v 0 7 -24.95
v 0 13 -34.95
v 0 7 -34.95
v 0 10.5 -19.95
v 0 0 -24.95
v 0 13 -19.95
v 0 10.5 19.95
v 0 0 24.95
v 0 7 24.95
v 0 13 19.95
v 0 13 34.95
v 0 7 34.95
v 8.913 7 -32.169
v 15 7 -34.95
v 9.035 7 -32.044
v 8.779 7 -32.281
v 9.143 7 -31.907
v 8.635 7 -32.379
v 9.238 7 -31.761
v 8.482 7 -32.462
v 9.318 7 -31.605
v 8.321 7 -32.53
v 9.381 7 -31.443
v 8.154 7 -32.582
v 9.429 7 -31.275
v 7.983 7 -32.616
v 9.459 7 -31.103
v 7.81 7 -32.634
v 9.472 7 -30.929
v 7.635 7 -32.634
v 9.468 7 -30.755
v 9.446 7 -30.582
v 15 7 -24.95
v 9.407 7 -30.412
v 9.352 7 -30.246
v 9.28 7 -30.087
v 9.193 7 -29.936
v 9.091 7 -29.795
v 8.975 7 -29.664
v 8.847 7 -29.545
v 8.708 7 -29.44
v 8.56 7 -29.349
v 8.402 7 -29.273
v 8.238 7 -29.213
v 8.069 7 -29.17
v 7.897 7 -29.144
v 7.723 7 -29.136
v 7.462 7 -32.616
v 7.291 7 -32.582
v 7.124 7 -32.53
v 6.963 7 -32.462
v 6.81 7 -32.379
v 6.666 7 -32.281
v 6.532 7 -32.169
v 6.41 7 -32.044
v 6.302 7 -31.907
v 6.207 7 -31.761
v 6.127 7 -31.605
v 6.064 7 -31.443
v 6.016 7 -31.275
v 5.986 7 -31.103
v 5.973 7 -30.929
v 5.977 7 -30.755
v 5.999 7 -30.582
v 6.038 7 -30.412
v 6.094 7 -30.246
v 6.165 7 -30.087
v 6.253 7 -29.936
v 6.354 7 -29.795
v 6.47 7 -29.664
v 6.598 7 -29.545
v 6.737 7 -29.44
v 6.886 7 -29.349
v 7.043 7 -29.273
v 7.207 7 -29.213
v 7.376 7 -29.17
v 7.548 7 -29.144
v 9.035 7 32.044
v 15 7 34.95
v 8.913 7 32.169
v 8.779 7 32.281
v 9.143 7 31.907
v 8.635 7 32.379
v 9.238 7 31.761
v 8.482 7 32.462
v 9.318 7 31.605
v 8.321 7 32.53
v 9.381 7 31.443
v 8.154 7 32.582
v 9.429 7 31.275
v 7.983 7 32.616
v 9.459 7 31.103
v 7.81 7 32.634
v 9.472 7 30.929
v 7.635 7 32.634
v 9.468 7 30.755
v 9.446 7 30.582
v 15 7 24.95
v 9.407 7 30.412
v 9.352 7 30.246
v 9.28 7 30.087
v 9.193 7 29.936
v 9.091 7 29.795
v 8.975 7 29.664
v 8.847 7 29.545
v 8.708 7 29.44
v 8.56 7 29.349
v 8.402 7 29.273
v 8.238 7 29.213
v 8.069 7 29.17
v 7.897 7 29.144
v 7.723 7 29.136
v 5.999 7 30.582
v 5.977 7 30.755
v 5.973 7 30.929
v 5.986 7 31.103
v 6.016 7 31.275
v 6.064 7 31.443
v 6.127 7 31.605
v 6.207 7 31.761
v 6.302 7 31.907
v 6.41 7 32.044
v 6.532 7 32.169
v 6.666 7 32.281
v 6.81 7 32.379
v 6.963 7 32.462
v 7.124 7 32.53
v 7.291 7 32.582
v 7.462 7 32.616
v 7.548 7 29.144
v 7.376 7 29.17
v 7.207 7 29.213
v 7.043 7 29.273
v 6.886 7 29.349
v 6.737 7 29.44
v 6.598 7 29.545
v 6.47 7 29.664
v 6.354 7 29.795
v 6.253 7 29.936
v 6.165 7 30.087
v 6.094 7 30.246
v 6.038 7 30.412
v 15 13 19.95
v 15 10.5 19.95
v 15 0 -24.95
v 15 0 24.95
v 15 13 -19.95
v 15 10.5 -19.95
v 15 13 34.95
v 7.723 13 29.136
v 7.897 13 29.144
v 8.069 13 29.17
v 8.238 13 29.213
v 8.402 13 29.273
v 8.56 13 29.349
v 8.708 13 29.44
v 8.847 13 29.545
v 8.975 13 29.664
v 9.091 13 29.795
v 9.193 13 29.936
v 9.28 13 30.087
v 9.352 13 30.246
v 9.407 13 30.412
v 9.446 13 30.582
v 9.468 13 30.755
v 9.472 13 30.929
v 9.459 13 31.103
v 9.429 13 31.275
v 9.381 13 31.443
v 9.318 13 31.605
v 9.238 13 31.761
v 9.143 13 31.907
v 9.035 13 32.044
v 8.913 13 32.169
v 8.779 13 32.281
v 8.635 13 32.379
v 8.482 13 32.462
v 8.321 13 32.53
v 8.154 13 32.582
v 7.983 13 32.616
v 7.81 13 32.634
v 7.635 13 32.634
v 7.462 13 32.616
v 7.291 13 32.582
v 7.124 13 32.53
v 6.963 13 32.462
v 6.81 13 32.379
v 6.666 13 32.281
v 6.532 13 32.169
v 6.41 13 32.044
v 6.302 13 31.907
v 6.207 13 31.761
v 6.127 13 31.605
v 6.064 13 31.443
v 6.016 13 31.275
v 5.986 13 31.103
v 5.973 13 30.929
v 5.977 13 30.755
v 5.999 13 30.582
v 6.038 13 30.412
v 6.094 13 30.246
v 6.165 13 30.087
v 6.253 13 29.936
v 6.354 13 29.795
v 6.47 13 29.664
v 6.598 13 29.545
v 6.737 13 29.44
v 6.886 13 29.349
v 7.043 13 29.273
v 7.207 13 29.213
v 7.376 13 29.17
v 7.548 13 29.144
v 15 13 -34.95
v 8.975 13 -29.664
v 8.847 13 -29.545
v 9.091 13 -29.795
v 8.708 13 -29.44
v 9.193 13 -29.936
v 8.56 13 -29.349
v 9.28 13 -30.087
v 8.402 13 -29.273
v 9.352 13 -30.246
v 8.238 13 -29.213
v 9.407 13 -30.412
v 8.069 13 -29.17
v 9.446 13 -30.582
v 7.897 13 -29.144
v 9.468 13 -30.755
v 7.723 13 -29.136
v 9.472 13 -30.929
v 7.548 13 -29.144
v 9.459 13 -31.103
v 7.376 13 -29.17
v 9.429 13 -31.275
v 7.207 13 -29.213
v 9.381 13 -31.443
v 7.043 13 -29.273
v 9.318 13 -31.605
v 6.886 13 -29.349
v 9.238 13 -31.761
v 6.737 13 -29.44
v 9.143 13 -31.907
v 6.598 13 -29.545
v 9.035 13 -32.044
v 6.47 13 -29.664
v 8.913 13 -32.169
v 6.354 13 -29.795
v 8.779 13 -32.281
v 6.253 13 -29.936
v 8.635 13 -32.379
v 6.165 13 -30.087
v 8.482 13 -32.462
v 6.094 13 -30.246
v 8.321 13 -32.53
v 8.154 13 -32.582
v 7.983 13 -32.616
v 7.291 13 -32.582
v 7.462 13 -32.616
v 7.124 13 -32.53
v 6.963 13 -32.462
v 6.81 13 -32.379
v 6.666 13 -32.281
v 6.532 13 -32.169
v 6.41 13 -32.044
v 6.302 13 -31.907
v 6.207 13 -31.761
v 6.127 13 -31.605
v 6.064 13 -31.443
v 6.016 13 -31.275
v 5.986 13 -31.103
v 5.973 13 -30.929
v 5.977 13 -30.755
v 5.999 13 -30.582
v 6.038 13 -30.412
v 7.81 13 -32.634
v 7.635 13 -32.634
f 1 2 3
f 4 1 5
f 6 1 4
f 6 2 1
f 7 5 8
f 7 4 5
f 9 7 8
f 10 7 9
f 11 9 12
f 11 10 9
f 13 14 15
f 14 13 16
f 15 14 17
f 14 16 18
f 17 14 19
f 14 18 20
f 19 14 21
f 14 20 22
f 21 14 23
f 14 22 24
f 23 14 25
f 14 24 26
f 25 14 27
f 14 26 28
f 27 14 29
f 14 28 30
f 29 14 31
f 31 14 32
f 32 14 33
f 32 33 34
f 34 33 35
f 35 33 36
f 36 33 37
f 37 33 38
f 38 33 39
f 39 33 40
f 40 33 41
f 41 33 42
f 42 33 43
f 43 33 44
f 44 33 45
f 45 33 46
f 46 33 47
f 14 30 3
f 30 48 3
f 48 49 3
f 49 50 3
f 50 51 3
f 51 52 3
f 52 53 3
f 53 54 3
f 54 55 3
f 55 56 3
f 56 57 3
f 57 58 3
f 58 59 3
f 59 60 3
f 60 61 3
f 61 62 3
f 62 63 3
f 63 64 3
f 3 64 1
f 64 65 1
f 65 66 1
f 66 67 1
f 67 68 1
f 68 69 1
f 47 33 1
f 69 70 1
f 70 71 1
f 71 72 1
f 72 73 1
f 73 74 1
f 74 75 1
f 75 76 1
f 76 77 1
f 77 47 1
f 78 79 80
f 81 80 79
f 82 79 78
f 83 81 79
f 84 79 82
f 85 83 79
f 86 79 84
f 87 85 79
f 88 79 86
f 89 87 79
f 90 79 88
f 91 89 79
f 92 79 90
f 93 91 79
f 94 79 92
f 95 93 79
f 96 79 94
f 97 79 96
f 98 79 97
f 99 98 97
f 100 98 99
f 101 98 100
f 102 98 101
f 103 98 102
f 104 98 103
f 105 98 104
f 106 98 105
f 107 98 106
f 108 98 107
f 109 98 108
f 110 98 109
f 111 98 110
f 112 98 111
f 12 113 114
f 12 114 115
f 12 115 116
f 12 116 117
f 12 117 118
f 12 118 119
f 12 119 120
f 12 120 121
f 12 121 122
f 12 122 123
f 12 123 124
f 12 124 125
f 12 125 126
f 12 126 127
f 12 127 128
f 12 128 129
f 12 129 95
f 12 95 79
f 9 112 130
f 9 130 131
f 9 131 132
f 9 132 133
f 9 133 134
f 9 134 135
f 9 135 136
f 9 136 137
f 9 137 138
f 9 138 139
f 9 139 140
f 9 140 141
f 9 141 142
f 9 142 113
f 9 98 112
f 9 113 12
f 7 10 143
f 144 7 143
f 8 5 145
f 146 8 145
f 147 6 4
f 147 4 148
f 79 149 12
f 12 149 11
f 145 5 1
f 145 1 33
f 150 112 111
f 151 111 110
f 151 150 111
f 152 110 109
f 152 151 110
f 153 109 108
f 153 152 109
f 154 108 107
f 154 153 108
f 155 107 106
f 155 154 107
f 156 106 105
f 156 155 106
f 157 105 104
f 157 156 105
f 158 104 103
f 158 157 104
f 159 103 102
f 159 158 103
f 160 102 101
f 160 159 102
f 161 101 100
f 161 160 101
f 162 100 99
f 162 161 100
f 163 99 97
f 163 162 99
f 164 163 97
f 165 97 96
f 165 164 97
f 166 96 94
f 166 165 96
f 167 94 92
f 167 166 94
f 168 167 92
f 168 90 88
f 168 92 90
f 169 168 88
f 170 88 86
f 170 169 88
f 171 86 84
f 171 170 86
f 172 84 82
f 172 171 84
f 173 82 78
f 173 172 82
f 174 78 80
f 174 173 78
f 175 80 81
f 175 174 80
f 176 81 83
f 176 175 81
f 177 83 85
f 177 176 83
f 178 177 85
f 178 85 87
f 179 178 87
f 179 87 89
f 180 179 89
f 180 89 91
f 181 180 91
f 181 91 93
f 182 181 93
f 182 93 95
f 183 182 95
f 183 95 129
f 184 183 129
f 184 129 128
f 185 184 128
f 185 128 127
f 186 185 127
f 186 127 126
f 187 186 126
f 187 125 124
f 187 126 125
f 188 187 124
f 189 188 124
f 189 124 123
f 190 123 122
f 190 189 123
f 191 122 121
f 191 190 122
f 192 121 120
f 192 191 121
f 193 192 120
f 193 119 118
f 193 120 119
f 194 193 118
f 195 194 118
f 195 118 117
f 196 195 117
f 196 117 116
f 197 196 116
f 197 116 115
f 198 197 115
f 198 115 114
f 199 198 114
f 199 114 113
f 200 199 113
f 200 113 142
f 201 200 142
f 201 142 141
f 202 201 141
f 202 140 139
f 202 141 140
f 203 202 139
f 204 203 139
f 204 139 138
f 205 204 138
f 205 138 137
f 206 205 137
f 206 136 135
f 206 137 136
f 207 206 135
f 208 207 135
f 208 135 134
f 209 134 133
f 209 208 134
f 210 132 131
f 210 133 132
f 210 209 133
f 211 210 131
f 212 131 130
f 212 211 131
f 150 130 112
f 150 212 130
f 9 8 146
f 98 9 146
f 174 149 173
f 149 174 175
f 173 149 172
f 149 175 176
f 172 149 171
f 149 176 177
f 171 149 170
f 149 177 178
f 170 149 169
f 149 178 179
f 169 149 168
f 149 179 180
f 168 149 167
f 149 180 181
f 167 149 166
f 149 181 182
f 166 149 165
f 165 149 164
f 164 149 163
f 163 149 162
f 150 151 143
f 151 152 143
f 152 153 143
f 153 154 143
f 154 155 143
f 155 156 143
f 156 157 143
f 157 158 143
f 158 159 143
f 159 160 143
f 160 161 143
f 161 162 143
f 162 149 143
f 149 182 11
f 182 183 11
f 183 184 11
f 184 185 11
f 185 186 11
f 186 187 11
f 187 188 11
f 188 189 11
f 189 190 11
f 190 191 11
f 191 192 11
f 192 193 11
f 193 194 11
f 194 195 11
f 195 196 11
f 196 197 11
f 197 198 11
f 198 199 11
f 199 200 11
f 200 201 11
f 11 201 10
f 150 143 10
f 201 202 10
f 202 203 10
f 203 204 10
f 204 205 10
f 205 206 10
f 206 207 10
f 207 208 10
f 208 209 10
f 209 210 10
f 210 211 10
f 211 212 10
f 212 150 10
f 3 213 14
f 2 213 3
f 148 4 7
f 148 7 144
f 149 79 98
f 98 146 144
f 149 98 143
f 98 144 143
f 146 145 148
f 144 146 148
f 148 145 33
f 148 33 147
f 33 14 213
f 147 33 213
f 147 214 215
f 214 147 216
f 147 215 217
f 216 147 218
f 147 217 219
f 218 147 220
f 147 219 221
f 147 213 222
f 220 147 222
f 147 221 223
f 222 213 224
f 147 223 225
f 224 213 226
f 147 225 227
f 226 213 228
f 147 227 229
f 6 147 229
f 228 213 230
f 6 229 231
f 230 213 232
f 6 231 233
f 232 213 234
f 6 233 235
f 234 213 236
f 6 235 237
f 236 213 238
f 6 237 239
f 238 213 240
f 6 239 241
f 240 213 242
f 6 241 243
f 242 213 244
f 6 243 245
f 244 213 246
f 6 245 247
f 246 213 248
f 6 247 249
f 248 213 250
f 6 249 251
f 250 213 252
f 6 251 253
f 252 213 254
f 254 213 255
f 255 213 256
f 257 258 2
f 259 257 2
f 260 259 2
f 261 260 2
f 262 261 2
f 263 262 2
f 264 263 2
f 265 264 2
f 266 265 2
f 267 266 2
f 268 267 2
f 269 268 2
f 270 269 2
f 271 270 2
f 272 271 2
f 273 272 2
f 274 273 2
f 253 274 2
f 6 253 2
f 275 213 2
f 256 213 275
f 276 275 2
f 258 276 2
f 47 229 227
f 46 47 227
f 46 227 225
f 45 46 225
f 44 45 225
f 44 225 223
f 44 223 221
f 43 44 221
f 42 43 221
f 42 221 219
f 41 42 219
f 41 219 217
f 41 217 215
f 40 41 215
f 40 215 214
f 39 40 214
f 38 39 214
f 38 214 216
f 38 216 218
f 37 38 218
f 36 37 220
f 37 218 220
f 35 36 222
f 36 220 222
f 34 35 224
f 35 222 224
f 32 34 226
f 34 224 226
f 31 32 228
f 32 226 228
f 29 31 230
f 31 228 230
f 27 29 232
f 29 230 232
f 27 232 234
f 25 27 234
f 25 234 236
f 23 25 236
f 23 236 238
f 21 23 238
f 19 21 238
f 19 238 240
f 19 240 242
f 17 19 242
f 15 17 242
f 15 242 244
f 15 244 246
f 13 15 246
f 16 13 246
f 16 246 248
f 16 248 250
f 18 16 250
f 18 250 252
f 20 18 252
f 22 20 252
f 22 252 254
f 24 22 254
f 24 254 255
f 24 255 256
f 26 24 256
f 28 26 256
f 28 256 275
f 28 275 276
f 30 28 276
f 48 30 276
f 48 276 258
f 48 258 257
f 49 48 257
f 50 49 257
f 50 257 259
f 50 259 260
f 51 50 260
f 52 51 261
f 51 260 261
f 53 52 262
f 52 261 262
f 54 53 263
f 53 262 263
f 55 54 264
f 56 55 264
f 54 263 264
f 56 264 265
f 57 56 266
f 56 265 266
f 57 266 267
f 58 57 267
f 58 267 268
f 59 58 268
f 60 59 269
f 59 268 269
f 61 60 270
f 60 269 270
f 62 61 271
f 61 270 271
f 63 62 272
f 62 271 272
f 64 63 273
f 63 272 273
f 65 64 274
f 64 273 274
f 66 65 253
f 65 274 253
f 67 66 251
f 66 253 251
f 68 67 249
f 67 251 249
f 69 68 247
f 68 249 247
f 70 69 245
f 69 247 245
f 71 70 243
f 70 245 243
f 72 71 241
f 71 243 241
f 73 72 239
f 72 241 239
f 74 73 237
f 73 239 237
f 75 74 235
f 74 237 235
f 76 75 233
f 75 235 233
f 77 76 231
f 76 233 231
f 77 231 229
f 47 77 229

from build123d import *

# Parameters (mm, degrees)
SKETCH1_W           = 15
SKETCH1_H           = 49.9
BOSS_EXTRUDE1_DEPTH = 2
SKETCH2_W           = 45
SKETCH2_H           = 5
BOSS_EXTRUDE2_DEPTH = 5
SKETCH4_W           = 15
SKETCH4_H           = 49.9
BOSS_EXTRUDE3_DEPTH = 13
SKETCH5_W           = 15
SKETCH5_H           = 6
BOSS_EXTRUDE4_DEPTH = 10
SKETCH6_R           = 1.75
CUT_EXTRUDE2_DEPTH  = 48.859194519
SKETCH7_W           = 15
SKETCH7_H           = 39.9
CUT_EXTRUDE3_DEPTH  = 2.5
SKETCH8_W           = 50.368588126
SKETCH8_H           = 13
CUT_EXTRUDE4_DEPTH  = 48.859194519


with BuildPart() as part:
    # Sketch1 → Boss-Extrude1 (new body)
    with BuildSketch(Plane(origin=(0, 0, 0), x_dir=(1, 0, 0), z_dir=(0, 1, 0))):
        with Locations((7.5, 0)):
            Rectangle(SKETCH1_W, SKETCH1_H)
    extrude(amount=BOSS_EXTRUDE1_DEPTH)

    # Sketch2 → Boss-Extrude2 (add)
    with BuildSketch(Plane(origin=(0, 2, 0), x_dir=(1, 0, 0), z_dir=(0, 1, 0))):
        with Locations((-7.5, -22.45)):
            Rectangle(SKETCH2_W, SKETCH2_H)
        with Locations((-7.5, 22.45)):
            Rectangle(SKETCH2_W, SKETCH2_H)
    extrude(amount=BOSS_EXTRUDE2_DEPTH)

    # Sketch4 → Boss-Extrude3 (add)
    with BuildSketch(Plane(origin=(0, 0, 0), x_dir=(1, 0, 0), z_dir=(0, 1, 0))):
        with Locations((7.5, 0)):
            Rectangle(SKETCH4_W, SKETCH4_H)
    extrude(amount=BOSS_EXTRUDE3_DEPTH)

    # Sketch5 → Boss-Extrude4 (add)
    with BuildSketch(Plane(origin=(0, 0, -24.95), x_dir=(-1, 0, 0), z_dir=(0, 0, -1))):
        with Locations((-7.5, 10)):
            Rectangle(SKETCH5_W, SKETCH5_H)
    boss_extrude4 = extrude(amount=BOSS_EXTRUDE4_DEPTH)

    # Sketch6 → Cut-Extrude2 (cut, through all)
    with BuildSketch(Plane(origin=(0, 13, 0), x_dir=(1, 0, 0), z_dir=(0, 1, 0))):
        with Locations((7.722564817, 30.885688998)):
            Circle(SKETCH6_R)
    cut_extrude2 = extrude(amount=-CUT_EXTRUDE2_DEPTH, mode=Mode.SUBTRACT)

    # Mirror1: Boss-Extrude4, Cut-Extrude2 across plane
    add(boss_extrude4.mirror(Plane.XY))
    add(cut_extrude2.mirror(Plane.XY), mode=Mode.SUBTRACT)

    # Sketch7 → Cut-Extrude3 (cut)
    with BuildSketch(Plane(origin=(0, 13, 0), x_dir=(1, 0, 0), z_dir=(0, 1, 0))):
        with Locations((7.5, 0)):
            Rectangle(SKETCH7_W, SKETCH7_H)
    extrude(amount=-CUT_EXTRUDE3_DEPTH, mode=Mode.SUBTRACT)

    # Sketch8 → Cut-Extrude4 (cut, through all)
    with BuildSketch(Plane.ZY):
        with Locations((0.234294063, 6.5)):
            Rectangle(SKETCH8_W, SKETCH8_H)
    extrude(amount=CUT_EXTRUDE4_DEPTH, mode=Mode.SUBTRACT)


solid = part.part
